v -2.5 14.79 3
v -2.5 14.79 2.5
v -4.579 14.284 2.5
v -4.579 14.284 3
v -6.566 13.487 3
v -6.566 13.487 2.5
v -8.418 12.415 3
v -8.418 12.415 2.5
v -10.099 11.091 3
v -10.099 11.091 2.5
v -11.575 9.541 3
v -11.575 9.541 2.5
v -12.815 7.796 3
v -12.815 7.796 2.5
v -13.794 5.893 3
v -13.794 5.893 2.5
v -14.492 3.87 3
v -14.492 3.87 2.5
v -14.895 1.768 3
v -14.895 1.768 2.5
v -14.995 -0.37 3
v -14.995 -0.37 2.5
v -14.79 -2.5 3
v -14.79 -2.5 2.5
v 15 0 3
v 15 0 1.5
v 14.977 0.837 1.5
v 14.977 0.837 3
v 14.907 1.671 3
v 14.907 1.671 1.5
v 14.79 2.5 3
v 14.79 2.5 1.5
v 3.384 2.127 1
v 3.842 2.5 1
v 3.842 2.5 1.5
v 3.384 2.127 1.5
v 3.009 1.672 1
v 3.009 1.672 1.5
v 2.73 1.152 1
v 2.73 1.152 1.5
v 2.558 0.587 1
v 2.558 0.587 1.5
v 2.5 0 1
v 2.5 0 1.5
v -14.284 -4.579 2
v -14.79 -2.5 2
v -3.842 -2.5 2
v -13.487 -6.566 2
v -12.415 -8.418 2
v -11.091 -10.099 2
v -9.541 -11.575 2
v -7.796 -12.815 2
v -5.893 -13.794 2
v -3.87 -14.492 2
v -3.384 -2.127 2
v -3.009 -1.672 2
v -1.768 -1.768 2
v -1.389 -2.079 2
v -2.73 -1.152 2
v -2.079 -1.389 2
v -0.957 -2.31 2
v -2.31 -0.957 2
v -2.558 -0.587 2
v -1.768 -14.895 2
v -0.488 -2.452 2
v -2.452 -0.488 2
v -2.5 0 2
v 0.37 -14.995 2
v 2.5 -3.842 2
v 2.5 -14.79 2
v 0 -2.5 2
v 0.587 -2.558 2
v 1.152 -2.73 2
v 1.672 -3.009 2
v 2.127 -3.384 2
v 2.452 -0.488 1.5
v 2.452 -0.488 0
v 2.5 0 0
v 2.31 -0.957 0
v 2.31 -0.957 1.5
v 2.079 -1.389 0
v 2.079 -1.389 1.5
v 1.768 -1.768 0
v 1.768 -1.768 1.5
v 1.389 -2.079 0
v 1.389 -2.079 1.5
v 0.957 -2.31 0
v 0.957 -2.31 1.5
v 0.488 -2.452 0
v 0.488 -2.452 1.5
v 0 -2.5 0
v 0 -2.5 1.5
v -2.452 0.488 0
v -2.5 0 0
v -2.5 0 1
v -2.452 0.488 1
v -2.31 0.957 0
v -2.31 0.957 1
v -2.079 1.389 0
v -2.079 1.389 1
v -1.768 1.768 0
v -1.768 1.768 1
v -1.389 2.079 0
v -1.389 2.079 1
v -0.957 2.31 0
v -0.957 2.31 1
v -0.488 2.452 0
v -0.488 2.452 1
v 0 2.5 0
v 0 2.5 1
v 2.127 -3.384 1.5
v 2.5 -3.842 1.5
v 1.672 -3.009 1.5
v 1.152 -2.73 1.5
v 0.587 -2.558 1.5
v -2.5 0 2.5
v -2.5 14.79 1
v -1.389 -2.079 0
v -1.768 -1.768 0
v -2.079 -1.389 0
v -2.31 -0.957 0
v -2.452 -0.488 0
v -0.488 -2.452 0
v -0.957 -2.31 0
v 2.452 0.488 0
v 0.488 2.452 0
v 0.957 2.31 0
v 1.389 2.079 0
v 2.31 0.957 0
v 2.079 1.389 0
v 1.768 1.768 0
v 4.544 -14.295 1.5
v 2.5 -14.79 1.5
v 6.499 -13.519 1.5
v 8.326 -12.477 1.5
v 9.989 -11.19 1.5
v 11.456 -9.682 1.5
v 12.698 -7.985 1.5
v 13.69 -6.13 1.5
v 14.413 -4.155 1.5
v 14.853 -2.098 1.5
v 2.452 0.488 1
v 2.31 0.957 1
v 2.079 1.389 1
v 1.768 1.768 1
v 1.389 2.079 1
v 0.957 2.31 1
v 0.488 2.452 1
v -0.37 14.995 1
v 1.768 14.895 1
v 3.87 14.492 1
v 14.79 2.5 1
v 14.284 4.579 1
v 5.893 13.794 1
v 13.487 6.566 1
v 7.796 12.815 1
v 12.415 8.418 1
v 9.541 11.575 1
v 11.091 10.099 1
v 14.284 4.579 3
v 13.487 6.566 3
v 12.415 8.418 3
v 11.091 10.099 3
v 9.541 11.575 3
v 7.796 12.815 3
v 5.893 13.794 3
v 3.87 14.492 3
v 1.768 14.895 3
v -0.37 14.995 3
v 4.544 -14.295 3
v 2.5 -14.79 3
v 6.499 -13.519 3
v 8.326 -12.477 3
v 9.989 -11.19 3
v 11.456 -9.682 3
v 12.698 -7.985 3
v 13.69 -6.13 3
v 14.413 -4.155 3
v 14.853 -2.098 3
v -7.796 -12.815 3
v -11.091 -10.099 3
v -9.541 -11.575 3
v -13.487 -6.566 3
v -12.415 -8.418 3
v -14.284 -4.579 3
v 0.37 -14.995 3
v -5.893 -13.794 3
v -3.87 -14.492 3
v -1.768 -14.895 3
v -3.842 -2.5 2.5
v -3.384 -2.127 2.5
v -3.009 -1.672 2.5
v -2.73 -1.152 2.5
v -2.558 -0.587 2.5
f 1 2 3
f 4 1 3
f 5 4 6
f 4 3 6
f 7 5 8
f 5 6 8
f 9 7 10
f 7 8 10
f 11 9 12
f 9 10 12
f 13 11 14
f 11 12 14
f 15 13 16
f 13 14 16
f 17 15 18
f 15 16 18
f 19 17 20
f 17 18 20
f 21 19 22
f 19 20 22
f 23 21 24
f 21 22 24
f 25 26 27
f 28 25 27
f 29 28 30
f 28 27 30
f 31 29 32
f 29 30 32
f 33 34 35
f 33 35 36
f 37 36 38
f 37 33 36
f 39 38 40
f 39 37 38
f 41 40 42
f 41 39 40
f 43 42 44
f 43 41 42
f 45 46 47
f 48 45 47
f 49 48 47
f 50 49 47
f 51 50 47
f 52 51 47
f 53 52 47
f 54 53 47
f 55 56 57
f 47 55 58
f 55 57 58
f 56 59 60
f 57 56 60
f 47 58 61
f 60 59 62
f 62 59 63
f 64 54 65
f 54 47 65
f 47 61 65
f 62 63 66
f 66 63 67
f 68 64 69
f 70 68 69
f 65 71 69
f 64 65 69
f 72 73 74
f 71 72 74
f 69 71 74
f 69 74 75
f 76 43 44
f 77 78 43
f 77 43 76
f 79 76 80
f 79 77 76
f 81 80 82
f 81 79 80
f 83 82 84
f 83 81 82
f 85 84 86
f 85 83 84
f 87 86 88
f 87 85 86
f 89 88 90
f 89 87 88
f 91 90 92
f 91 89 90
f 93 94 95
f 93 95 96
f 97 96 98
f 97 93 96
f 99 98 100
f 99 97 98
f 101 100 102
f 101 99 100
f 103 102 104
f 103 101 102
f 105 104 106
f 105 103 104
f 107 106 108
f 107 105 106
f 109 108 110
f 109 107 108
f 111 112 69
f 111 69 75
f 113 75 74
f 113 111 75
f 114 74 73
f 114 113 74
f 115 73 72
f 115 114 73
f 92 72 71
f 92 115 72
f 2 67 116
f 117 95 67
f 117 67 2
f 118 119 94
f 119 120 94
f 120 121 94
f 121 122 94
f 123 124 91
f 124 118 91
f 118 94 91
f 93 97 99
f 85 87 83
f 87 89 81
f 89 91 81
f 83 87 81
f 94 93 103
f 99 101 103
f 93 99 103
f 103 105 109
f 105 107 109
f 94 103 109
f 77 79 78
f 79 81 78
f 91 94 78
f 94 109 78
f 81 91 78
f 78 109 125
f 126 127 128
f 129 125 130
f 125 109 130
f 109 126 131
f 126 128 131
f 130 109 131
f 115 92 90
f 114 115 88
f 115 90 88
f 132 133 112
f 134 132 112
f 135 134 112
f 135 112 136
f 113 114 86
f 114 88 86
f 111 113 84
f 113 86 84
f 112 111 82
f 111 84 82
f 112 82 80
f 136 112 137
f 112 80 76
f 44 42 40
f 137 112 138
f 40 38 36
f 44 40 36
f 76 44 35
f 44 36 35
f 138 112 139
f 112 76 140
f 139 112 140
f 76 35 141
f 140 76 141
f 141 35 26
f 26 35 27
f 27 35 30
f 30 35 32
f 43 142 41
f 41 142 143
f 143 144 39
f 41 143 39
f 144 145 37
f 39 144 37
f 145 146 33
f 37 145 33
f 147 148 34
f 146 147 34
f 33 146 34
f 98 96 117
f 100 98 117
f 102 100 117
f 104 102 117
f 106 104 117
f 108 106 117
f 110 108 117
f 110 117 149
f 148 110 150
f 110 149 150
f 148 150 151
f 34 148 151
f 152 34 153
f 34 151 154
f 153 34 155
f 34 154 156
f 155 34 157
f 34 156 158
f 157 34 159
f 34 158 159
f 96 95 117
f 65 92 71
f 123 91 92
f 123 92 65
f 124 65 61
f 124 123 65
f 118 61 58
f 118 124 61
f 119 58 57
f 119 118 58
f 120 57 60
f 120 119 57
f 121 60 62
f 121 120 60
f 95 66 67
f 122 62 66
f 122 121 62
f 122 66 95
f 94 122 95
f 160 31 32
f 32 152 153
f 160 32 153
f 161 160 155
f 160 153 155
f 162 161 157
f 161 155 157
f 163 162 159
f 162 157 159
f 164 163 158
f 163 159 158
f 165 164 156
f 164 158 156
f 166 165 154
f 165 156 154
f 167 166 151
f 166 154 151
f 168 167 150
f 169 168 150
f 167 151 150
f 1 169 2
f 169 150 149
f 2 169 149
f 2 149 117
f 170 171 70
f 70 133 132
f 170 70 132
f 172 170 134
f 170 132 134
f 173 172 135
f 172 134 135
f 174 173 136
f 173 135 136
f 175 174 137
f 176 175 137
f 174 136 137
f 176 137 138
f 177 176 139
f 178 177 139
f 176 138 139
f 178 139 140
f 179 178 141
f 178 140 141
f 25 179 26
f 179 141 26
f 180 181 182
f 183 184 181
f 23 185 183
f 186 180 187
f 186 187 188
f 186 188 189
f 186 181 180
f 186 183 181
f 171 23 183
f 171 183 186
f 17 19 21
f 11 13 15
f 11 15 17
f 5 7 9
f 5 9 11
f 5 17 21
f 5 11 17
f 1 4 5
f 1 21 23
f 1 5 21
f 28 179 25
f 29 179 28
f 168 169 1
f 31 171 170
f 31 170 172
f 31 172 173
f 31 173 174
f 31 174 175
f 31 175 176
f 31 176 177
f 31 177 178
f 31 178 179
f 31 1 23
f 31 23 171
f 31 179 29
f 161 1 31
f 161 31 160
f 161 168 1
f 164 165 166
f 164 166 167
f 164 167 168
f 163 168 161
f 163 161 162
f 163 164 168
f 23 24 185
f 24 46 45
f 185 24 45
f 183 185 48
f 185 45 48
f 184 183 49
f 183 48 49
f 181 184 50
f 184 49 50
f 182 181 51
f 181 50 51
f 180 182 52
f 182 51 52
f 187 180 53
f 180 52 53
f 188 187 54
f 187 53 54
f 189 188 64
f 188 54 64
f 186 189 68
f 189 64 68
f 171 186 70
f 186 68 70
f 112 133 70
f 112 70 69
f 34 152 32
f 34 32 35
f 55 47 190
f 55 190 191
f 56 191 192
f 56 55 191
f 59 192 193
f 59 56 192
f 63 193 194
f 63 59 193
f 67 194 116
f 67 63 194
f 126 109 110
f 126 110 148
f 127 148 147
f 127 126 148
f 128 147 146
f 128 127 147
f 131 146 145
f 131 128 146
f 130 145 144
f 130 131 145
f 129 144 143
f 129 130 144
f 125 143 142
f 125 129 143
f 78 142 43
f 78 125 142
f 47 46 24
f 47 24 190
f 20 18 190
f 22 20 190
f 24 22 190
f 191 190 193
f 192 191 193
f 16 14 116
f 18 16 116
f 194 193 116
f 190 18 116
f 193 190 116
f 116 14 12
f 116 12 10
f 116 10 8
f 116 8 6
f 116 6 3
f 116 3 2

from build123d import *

# Parameters (mm, degrees)
F1_DEPTH = 3
F2_DEPTH = 2.5
F3_DEPTH = 2
F4_DEPTH = 1.5
F5_DEPTH = 1


with BuildPart() as f1:
    # F0 (on Top) → F1 (new body)
    with BuildSketch(Plane.XY):
        with BuildLine():
            ThreePointArc((0, 2.5), (-1.767766953, 1.767766953), (-2.5, 0))
            ThreePointArc((-2.5, 0), (-1.767766953, -1.767766953), (0, -2.5))
            ThreePointArc((0, -2.5), (1.767766953, -1.767766953), (2.5, 0))
            ThreePointArc((2.5, 0), (1.767766953, 1.767766953), (0, 2.5))
        make_face()
        with BuildLine():
            Line((-2.5, 0), (-2.5, 14.7901994577))
            ThreePointArc((-2.5, 14.7901994577), (-12.2260172846, 8.6904833787), (-14.7901994577, -2.5))
            Line((-14.7901994577, -2.5), (-3.8416876048, -2.5))
            ThreePointArc((-3.8416876048, -2.5), (-2.8566179631, -1.4186371655), (-2.5, 0))
        make_face()
        with BuildLine():
            Line((3.8416876048, 2.5), (14.7901994577, 2.5))
            ThreePointArc((14.7901994577, 2.5), (8.6904833787, 12.2260172846), (-2.5, 14.7901994577))
            Line((-2.5, 14.7901994577), (-2.5, 0))
            ThreePointArc((-2.5, 0), (-1.767766953, 1.767766953), (0, 2.5))
            Line((0, 2.5), (3.8416876048, 2.5))
        make_face()
        with BuildLine():
            ThreePointArc((2.5, 0), (2.8566179631, 1.4186371655), (3.8416876048, 2.5))
            Line((3.8416876048, 2.5), (0, 2.5))
            ThreePointArc((0, 2.5), (1.767766953, 1.767766953), (2.5, 0))
        make_face()
        with BuildLine():
            ThreePointArc((2.5, -14.7901994577), (11.4564392374, -9.6824583655), (15, 0))
            ThreePointArc((15, 0), (14.9474578418, 1.2543939042), (14.7901994577, 2.5))
            Line((14.7901994577, 2.5), (3.8416876048, 2.5))
            ThreePointArc((3.8416876048, 2.5), (2.8566179631, 1.4186371655), (2.5, 0))
            Line((2.5, 0), (2.5, -3.8416876048))
            Line((2.5, -3.8416876048), (2.5, -14.7901994577))
        make_face()
        with BuildLine():
            ThreePointArc((0, -2.5), (1.4186371655, -2.8566179631), (2.5, -3.8416876048))
            Line((2.5, -3.8416876048), (2.5, 0))
            ThreePointArc((2.5, 0), (1.767766953, -1.767766953), (0, -2.5))
        make_face()
        with BuildLine():
            ThreePointArc((-14.7901994577, -2.5), (-8.6904833787, -12.2260172846), (2.5, -14.7901994577))
            Line((2.5, -14.7901994577), (2.5, -3.8416876048))
            ThreePointArc((2.5, -3.8416876048), (1.4186371655, -2.8566179631), (0, -2.5))
            Line((0, -2.5), (-3.8416876048, -2.5))
            Line((-3.8416876048, -2.5), (-14.7901994577, -2.5))
        make_face()
        with BuildLine():
            ThreePointArc((0, -2.5), (-1.767766953, -1.767766953), (-2.5, 0))
            ThreePointArc((-2.5, 0), (-2.8566179631, -1.4186371655), (-3.8416876048, -2.5))
            Line((-3.8416876048, -2.5), (0, -2.5))
        make_face()
    extrude(amount=F1_DEPTH)

    # F0 (on Top) → F2 (cut)
    with BuildSketch(Plane.XY):
        with BuildLine():
            Line((-2.5, 0), (-2.5, 14.7901994577))
            ThreePointArc((-2.5, 14.7901994577), (-12.2260172846, 8.6904833787), (-14.7901994577, -2.5))
            Line((-14.7901994577, -2.5), (-3.8416876048, -2.5))
            ThreePointArc((-3.8416876048, -2.5), (-2.8566179631, -1.4186371655), (-2.5, 0))
        make_face()
    extrude(amount=F2_DEPTH, mode=Mode.SUBTRACT)

    # F0 (on Top) → F3 (cut)
    with BuildSketch(Plane.XY):
        with BuildLine():
            ThreePointArc((-14.7901994577, -2.5), (-8.6904833787, -12.2260172846), (2.5, -14.7901994577))
            Line((2.5, -14.7901994577), (2.5, -3.8416876048))
            ThreePointArc((2.5, -3.8416876048), (1.4186371655, -2.8566179631), (0, -2.5))
            Line((0, -2.5), (-3.8416876048, -2.5))
            Line((-3.8416876048, -2.5), (-14.7901994577, -2.5))
        make_face()
        with BuildLine():
            ThreePointArc((0, -2.5), (-1.767766953, -1.767766953), (-2.5, 0))
            ThreePointArc((-2.5, 0), (-2.8566179631, -1.4186371655), (-3.8416876048, -2.5))
            Line((-3.8416876048, -2.5), (0, -2.5))
        make_face()
    extrude(amount=F3_DEPTH, mode=Mode.SUBTRACT)

    # F0 (on Top) → F4 (cut)
    with BuildSketch(Plane.XY):
        with BuildLine():
            ThreePointArc((2.5, -14.7901994577), (11.4564392374, -9.6824583655), (15, 0))
            ThreePointArc((15, 0), (14.9474578418, 1.2543939042), (14.7901994577, 2.5))
            Line((14.7901994577, 2.5), (3.8416876048, 2.5))
            ThreePointArc((3.8416876048, 2.5), (2.8566179631, 1.4186371655), (2.5, 0))
            Line((2.5, 0), (2.5, -3.8416876048))
            Line((2.5, -3.8416876048), (2.5, -14.7901994577))
        make_face()
        with BuildLine():
            ThreePointArc((0, -2.5), (1.4186371655, -2.8566179631), (2.5, -3.8416876048))
            Line((2.5, -3.8416876048), (2.5, 0))
            ThreePointArc((2.5, 0), (1.767766953, -1.767766953), (0, -2.5))
        make_face()
    extrude(amount=F4_DEPTH, mode=Mode.SUBTRACT)

    # F0 (on Top) → F5 (cut)
    with BuildSketch(Plane.XY):
        with BuildLine():
            Line((3.8416876048, 2.5), (14.7901994577, 2.5))
            ThreePointArc((14.7901994577, 2.5), (8.6904833787, 12.2260172846), (-2.5, 14.7901994577))
            Line((-2.5, 14.7901994577), (-2.5, 0))
            ThreePointArc((-2.5, 0), (-1.767766953, 1.767766953), (0, 2.5))
            Line((0, 2.5), (3.8416876048, 2.5))
        make_face()
        with BuildLine():
            ThreePointArc((2.5, 0), (2.8566179631, 1.4186371655), (3.8416876048, 2.5))
            Line((3.8416876048, 2.5), (0, 2.5))
            ThreePointArc((0, 2.5), (1.767766953, 1.767766953), (2.5, 0))
        make_face()
    extrude(amount=F5_DEPTH, mode=Mode.SUBTRACT)


solid = f1.part
